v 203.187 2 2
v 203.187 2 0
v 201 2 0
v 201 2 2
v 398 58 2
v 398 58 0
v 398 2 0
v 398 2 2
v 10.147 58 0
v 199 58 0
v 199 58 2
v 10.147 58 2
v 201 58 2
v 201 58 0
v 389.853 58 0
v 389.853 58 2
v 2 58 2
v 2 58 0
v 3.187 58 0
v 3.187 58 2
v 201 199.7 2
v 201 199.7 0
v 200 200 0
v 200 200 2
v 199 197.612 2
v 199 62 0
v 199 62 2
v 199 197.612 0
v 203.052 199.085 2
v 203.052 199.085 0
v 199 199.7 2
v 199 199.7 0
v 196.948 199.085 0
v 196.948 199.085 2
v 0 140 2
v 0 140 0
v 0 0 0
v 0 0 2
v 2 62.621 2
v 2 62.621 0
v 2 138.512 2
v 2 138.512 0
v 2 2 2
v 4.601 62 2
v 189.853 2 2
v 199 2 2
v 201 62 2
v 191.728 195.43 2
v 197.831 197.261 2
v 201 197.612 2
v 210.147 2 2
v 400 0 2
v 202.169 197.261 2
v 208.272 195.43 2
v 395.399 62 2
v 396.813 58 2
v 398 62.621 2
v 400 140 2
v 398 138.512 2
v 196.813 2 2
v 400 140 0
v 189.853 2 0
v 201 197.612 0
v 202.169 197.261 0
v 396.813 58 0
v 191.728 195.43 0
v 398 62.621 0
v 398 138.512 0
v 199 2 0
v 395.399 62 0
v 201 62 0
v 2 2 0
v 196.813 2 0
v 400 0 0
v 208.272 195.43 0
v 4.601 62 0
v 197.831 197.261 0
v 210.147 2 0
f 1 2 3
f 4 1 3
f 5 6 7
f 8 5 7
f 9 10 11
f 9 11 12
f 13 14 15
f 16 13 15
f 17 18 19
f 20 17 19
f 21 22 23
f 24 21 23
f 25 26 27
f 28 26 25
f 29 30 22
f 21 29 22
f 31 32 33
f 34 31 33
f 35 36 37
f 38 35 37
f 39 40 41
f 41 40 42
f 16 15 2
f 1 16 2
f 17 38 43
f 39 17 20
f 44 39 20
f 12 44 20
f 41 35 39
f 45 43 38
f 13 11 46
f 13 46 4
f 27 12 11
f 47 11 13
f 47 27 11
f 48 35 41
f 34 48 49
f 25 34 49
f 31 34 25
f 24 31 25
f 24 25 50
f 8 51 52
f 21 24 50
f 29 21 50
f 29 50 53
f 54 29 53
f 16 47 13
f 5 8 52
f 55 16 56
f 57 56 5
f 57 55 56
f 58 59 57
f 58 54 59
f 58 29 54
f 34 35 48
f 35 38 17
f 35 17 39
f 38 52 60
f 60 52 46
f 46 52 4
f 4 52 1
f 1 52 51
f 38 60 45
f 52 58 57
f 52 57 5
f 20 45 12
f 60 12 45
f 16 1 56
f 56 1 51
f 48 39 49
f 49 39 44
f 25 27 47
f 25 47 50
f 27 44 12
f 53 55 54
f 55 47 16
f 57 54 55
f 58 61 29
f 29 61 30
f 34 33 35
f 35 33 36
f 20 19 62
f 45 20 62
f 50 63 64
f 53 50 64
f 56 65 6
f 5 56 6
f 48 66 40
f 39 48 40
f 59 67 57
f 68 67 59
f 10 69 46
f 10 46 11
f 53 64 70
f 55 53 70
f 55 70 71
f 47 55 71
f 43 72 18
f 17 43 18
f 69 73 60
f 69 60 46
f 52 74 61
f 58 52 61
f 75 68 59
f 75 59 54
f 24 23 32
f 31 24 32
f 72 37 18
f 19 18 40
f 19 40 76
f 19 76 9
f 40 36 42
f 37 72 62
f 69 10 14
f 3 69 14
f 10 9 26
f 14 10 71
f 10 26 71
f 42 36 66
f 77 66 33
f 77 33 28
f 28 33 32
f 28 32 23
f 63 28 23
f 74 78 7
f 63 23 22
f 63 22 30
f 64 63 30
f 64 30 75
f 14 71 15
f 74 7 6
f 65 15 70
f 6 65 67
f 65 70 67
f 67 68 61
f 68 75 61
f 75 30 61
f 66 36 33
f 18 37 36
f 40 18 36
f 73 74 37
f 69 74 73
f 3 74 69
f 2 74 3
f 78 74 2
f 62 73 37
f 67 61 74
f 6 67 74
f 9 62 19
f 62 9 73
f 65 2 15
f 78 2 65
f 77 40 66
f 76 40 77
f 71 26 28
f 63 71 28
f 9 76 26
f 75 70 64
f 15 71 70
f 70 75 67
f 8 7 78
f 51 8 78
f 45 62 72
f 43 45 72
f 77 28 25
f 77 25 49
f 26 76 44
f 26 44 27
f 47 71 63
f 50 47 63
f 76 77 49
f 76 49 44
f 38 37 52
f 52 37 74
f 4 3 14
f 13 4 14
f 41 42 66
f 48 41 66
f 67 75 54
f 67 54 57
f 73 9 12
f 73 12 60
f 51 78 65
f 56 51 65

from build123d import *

# Parameters (mm, degrees)
EXTRUDE_1_DEPTH = 2


with BuildPart() as part:
    # Model → ﾎﾞｽ - 押し出し1 (new body)
    with BuildSketch(Plane.XY):
        Polygon((396.51989783, 60), (400, 60), (400, 61.22065558), (400, 140), (203.051638949, 199.084508315), (201, 199.7), (200, 200), (198.999999985, 199.699999996), (196.948361051, 199.084508315), (0, 140), (0, 61.22065558), (0, 60), (200, 60), align=None)
        Polygon((202.168514351, 197.261384393), (395.399063483, 62), (201, 62), (201, 197.611938698), align=None, mode=Mode.SUBTRACT)
        Polygon((2, 62.62065558), (2, 138.511938698), (191.728207796, 195.430401037), align=None, mode=Mode.SUBTRACT)
        Polygon((198.999999985, 197.611938694), (197.831485649, 197.261384393), (4.600936517, 62), (198.999999985, 62), align=None, mode=Mode.SUBTRACT)
        Polygon((398, 62.62065558), (398, 138.511938698), (208.271792204, 195.430401037), align=None, mode=Mode.SUBTRACT)
        Polygon((400, 0), (400, 58.955969334), (400, 60), (396.51989783, 60), (200, 60), (0, 60), (0, 58.955969334), (0, 0), align=None)
        Polygon((389.853231164, 58), (203.186564497, 2), (201, 2), (201, 58), align=None, mode=Mode.SUBTRACT)
        Polygon((210.146768888, 2), (396.813435555, 58), (398, 58), (398, 2), align=None, mode=Mode.SUBTRACT)
        Polygon((3.186564445, 58), (189.853231112, 2), (2, 2), (2, 58), align=None, mode=Mode.SUBTRACT)
        Polygon((196.813435503, 2), (198.999999985, 2), (198.999999985, 58), (10.146768836, 58), align=None, mode=Mode.SUBTRACT)
    extrude(amount=EXTRUDE_1_DEPTH)


solid = part.part
